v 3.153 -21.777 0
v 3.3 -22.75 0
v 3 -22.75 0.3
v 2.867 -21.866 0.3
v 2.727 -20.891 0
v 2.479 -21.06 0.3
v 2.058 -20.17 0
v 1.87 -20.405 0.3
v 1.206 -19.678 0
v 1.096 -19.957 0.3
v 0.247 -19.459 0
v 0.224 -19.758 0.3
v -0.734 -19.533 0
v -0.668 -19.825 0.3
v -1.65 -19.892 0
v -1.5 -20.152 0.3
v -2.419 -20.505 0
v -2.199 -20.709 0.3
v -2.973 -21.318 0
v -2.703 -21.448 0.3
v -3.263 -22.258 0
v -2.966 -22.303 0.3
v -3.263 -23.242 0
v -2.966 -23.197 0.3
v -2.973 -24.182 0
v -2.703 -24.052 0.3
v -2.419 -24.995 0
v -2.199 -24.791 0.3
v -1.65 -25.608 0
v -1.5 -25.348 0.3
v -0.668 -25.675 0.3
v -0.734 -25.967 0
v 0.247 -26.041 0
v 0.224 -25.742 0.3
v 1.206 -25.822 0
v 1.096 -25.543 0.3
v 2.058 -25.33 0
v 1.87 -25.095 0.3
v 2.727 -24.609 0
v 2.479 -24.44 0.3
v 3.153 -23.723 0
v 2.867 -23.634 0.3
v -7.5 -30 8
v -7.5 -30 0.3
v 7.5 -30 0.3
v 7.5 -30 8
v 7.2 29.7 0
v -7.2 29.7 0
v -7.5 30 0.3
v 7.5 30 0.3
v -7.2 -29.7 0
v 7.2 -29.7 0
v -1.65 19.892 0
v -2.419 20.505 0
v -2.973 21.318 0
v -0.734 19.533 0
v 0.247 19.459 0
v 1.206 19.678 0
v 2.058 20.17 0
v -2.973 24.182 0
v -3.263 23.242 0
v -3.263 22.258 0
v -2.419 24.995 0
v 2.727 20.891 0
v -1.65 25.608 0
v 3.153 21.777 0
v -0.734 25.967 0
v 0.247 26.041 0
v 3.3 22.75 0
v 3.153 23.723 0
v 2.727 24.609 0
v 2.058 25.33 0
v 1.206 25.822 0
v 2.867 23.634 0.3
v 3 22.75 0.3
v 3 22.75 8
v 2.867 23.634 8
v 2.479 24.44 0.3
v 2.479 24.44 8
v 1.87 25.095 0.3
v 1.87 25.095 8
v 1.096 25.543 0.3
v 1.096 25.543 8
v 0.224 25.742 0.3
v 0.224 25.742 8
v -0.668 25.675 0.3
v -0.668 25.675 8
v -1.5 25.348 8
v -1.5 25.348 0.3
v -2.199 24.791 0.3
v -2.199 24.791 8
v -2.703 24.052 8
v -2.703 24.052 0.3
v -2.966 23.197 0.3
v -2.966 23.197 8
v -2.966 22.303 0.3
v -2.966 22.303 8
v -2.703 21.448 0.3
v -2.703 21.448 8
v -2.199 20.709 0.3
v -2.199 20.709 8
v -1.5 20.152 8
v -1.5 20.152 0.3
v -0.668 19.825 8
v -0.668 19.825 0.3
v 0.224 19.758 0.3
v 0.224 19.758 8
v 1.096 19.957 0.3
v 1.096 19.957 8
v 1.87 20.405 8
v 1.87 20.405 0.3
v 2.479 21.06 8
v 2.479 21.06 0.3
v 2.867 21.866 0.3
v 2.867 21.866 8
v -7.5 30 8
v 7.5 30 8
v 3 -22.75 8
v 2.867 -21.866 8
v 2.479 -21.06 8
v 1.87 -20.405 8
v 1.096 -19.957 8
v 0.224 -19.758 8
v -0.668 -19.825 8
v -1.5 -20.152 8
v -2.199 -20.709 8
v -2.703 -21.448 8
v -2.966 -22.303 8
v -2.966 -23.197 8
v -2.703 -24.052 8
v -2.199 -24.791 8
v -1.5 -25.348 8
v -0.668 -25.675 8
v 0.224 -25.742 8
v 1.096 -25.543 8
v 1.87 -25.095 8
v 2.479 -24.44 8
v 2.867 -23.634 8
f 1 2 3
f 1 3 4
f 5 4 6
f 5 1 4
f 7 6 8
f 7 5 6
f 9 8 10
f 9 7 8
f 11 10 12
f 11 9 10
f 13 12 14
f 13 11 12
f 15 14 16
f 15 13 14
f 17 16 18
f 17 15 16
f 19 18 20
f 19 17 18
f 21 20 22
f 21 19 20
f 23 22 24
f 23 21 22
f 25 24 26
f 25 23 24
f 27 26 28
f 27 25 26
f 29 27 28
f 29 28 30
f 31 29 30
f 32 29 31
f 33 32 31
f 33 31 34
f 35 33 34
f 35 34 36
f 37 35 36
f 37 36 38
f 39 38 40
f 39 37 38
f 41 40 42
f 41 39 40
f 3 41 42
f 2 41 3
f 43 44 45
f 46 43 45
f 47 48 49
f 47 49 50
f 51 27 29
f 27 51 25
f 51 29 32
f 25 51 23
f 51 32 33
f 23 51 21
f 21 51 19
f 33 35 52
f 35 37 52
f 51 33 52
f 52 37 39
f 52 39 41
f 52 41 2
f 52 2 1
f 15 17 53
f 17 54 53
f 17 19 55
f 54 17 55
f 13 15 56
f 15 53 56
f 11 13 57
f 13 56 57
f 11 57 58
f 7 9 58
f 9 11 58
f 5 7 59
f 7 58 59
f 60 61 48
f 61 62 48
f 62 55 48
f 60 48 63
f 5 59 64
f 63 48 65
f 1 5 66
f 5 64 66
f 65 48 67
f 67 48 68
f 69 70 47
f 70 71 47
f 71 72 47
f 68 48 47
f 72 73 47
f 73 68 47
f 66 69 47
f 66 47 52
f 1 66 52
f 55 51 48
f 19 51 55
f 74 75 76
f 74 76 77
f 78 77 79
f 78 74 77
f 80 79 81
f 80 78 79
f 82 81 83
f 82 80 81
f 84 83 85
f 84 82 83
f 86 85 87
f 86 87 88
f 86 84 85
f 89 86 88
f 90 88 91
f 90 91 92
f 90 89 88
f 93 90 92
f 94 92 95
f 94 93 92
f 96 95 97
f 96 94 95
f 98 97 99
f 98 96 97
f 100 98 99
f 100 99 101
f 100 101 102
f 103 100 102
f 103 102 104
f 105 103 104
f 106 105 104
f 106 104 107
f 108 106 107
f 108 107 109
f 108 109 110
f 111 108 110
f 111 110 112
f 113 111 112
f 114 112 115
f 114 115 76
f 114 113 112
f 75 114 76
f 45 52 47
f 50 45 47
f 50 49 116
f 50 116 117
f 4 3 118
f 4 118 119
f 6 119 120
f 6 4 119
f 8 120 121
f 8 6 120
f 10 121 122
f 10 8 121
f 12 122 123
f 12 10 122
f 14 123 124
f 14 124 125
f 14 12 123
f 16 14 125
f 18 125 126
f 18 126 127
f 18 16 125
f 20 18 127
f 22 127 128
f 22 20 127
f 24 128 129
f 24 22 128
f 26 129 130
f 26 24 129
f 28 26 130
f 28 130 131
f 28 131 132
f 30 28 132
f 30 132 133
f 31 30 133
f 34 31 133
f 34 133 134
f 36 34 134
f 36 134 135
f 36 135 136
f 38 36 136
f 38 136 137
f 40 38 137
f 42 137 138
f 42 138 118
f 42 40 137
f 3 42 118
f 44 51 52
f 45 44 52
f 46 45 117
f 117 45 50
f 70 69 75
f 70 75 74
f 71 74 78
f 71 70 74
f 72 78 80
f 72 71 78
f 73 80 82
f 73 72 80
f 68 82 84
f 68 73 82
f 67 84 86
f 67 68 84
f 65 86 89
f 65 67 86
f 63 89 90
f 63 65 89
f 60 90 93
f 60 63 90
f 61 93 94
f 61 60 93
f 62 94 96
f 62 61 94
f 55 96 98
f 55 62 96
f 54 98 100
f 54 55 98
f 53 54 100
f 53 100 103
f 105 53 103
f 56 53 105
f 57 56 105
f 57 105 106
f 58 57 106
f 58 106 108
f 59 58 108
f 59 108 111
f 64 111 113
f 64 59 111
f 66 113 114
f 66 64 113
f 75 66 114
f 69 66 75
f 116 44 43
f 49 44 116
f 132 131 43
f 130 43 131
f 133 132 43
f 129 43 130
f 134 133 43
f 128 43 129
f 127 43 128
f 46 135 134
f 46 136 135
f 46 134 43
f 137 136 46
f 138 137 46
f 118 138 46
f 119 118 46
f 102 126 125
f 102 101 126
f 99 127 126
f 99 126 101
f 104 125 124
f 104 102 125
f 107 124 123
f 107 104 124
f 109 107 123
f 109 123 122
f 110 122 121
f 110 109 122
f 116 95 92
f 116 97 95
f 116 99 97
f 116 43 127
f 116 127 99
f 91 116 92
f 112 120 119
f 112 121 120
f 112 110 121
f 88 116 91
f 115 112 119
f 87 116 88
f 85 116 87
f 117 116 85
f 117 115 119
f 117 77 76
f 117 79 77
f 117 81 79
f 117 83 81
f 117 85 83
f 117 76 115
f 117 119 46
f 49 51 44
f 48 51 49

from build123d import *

# Parameters (mm, degrees)
F0_W     = 15
F0_H     = 60
F0_R     = 3
F1_DEPTH = 8
F2_SIZE  = 0.3


with BuildPart() as f1:
    # F0 (on Top) → F1 (new body)
    with BuildSketch(Plane.XY):
        Rectangle(F0_W, F0_H)
        with Locations((0, -22.75)):
            Circle(F0_R, mode=Mode.SUBTRACT)
        with Locations((0, 22.75)):
            Circle(F0_R, mode=Mode.SUBTRACT)
    extrude(amount=F1_DEPTH)

    # F2
    f2_edges = [f1.edges().sort_by_distance(p)[0] for p in [
        (7.5, 0, 0),
        (0, 30, 0),
        (-7.5, 0, 0),
        (0, -30, 0),
        (-3, -22.75, 0),
        (-3, 22.75, 0),
    ]]
    chamfer(f2_edges, length=F2_SIZE)


solid = f1.part
